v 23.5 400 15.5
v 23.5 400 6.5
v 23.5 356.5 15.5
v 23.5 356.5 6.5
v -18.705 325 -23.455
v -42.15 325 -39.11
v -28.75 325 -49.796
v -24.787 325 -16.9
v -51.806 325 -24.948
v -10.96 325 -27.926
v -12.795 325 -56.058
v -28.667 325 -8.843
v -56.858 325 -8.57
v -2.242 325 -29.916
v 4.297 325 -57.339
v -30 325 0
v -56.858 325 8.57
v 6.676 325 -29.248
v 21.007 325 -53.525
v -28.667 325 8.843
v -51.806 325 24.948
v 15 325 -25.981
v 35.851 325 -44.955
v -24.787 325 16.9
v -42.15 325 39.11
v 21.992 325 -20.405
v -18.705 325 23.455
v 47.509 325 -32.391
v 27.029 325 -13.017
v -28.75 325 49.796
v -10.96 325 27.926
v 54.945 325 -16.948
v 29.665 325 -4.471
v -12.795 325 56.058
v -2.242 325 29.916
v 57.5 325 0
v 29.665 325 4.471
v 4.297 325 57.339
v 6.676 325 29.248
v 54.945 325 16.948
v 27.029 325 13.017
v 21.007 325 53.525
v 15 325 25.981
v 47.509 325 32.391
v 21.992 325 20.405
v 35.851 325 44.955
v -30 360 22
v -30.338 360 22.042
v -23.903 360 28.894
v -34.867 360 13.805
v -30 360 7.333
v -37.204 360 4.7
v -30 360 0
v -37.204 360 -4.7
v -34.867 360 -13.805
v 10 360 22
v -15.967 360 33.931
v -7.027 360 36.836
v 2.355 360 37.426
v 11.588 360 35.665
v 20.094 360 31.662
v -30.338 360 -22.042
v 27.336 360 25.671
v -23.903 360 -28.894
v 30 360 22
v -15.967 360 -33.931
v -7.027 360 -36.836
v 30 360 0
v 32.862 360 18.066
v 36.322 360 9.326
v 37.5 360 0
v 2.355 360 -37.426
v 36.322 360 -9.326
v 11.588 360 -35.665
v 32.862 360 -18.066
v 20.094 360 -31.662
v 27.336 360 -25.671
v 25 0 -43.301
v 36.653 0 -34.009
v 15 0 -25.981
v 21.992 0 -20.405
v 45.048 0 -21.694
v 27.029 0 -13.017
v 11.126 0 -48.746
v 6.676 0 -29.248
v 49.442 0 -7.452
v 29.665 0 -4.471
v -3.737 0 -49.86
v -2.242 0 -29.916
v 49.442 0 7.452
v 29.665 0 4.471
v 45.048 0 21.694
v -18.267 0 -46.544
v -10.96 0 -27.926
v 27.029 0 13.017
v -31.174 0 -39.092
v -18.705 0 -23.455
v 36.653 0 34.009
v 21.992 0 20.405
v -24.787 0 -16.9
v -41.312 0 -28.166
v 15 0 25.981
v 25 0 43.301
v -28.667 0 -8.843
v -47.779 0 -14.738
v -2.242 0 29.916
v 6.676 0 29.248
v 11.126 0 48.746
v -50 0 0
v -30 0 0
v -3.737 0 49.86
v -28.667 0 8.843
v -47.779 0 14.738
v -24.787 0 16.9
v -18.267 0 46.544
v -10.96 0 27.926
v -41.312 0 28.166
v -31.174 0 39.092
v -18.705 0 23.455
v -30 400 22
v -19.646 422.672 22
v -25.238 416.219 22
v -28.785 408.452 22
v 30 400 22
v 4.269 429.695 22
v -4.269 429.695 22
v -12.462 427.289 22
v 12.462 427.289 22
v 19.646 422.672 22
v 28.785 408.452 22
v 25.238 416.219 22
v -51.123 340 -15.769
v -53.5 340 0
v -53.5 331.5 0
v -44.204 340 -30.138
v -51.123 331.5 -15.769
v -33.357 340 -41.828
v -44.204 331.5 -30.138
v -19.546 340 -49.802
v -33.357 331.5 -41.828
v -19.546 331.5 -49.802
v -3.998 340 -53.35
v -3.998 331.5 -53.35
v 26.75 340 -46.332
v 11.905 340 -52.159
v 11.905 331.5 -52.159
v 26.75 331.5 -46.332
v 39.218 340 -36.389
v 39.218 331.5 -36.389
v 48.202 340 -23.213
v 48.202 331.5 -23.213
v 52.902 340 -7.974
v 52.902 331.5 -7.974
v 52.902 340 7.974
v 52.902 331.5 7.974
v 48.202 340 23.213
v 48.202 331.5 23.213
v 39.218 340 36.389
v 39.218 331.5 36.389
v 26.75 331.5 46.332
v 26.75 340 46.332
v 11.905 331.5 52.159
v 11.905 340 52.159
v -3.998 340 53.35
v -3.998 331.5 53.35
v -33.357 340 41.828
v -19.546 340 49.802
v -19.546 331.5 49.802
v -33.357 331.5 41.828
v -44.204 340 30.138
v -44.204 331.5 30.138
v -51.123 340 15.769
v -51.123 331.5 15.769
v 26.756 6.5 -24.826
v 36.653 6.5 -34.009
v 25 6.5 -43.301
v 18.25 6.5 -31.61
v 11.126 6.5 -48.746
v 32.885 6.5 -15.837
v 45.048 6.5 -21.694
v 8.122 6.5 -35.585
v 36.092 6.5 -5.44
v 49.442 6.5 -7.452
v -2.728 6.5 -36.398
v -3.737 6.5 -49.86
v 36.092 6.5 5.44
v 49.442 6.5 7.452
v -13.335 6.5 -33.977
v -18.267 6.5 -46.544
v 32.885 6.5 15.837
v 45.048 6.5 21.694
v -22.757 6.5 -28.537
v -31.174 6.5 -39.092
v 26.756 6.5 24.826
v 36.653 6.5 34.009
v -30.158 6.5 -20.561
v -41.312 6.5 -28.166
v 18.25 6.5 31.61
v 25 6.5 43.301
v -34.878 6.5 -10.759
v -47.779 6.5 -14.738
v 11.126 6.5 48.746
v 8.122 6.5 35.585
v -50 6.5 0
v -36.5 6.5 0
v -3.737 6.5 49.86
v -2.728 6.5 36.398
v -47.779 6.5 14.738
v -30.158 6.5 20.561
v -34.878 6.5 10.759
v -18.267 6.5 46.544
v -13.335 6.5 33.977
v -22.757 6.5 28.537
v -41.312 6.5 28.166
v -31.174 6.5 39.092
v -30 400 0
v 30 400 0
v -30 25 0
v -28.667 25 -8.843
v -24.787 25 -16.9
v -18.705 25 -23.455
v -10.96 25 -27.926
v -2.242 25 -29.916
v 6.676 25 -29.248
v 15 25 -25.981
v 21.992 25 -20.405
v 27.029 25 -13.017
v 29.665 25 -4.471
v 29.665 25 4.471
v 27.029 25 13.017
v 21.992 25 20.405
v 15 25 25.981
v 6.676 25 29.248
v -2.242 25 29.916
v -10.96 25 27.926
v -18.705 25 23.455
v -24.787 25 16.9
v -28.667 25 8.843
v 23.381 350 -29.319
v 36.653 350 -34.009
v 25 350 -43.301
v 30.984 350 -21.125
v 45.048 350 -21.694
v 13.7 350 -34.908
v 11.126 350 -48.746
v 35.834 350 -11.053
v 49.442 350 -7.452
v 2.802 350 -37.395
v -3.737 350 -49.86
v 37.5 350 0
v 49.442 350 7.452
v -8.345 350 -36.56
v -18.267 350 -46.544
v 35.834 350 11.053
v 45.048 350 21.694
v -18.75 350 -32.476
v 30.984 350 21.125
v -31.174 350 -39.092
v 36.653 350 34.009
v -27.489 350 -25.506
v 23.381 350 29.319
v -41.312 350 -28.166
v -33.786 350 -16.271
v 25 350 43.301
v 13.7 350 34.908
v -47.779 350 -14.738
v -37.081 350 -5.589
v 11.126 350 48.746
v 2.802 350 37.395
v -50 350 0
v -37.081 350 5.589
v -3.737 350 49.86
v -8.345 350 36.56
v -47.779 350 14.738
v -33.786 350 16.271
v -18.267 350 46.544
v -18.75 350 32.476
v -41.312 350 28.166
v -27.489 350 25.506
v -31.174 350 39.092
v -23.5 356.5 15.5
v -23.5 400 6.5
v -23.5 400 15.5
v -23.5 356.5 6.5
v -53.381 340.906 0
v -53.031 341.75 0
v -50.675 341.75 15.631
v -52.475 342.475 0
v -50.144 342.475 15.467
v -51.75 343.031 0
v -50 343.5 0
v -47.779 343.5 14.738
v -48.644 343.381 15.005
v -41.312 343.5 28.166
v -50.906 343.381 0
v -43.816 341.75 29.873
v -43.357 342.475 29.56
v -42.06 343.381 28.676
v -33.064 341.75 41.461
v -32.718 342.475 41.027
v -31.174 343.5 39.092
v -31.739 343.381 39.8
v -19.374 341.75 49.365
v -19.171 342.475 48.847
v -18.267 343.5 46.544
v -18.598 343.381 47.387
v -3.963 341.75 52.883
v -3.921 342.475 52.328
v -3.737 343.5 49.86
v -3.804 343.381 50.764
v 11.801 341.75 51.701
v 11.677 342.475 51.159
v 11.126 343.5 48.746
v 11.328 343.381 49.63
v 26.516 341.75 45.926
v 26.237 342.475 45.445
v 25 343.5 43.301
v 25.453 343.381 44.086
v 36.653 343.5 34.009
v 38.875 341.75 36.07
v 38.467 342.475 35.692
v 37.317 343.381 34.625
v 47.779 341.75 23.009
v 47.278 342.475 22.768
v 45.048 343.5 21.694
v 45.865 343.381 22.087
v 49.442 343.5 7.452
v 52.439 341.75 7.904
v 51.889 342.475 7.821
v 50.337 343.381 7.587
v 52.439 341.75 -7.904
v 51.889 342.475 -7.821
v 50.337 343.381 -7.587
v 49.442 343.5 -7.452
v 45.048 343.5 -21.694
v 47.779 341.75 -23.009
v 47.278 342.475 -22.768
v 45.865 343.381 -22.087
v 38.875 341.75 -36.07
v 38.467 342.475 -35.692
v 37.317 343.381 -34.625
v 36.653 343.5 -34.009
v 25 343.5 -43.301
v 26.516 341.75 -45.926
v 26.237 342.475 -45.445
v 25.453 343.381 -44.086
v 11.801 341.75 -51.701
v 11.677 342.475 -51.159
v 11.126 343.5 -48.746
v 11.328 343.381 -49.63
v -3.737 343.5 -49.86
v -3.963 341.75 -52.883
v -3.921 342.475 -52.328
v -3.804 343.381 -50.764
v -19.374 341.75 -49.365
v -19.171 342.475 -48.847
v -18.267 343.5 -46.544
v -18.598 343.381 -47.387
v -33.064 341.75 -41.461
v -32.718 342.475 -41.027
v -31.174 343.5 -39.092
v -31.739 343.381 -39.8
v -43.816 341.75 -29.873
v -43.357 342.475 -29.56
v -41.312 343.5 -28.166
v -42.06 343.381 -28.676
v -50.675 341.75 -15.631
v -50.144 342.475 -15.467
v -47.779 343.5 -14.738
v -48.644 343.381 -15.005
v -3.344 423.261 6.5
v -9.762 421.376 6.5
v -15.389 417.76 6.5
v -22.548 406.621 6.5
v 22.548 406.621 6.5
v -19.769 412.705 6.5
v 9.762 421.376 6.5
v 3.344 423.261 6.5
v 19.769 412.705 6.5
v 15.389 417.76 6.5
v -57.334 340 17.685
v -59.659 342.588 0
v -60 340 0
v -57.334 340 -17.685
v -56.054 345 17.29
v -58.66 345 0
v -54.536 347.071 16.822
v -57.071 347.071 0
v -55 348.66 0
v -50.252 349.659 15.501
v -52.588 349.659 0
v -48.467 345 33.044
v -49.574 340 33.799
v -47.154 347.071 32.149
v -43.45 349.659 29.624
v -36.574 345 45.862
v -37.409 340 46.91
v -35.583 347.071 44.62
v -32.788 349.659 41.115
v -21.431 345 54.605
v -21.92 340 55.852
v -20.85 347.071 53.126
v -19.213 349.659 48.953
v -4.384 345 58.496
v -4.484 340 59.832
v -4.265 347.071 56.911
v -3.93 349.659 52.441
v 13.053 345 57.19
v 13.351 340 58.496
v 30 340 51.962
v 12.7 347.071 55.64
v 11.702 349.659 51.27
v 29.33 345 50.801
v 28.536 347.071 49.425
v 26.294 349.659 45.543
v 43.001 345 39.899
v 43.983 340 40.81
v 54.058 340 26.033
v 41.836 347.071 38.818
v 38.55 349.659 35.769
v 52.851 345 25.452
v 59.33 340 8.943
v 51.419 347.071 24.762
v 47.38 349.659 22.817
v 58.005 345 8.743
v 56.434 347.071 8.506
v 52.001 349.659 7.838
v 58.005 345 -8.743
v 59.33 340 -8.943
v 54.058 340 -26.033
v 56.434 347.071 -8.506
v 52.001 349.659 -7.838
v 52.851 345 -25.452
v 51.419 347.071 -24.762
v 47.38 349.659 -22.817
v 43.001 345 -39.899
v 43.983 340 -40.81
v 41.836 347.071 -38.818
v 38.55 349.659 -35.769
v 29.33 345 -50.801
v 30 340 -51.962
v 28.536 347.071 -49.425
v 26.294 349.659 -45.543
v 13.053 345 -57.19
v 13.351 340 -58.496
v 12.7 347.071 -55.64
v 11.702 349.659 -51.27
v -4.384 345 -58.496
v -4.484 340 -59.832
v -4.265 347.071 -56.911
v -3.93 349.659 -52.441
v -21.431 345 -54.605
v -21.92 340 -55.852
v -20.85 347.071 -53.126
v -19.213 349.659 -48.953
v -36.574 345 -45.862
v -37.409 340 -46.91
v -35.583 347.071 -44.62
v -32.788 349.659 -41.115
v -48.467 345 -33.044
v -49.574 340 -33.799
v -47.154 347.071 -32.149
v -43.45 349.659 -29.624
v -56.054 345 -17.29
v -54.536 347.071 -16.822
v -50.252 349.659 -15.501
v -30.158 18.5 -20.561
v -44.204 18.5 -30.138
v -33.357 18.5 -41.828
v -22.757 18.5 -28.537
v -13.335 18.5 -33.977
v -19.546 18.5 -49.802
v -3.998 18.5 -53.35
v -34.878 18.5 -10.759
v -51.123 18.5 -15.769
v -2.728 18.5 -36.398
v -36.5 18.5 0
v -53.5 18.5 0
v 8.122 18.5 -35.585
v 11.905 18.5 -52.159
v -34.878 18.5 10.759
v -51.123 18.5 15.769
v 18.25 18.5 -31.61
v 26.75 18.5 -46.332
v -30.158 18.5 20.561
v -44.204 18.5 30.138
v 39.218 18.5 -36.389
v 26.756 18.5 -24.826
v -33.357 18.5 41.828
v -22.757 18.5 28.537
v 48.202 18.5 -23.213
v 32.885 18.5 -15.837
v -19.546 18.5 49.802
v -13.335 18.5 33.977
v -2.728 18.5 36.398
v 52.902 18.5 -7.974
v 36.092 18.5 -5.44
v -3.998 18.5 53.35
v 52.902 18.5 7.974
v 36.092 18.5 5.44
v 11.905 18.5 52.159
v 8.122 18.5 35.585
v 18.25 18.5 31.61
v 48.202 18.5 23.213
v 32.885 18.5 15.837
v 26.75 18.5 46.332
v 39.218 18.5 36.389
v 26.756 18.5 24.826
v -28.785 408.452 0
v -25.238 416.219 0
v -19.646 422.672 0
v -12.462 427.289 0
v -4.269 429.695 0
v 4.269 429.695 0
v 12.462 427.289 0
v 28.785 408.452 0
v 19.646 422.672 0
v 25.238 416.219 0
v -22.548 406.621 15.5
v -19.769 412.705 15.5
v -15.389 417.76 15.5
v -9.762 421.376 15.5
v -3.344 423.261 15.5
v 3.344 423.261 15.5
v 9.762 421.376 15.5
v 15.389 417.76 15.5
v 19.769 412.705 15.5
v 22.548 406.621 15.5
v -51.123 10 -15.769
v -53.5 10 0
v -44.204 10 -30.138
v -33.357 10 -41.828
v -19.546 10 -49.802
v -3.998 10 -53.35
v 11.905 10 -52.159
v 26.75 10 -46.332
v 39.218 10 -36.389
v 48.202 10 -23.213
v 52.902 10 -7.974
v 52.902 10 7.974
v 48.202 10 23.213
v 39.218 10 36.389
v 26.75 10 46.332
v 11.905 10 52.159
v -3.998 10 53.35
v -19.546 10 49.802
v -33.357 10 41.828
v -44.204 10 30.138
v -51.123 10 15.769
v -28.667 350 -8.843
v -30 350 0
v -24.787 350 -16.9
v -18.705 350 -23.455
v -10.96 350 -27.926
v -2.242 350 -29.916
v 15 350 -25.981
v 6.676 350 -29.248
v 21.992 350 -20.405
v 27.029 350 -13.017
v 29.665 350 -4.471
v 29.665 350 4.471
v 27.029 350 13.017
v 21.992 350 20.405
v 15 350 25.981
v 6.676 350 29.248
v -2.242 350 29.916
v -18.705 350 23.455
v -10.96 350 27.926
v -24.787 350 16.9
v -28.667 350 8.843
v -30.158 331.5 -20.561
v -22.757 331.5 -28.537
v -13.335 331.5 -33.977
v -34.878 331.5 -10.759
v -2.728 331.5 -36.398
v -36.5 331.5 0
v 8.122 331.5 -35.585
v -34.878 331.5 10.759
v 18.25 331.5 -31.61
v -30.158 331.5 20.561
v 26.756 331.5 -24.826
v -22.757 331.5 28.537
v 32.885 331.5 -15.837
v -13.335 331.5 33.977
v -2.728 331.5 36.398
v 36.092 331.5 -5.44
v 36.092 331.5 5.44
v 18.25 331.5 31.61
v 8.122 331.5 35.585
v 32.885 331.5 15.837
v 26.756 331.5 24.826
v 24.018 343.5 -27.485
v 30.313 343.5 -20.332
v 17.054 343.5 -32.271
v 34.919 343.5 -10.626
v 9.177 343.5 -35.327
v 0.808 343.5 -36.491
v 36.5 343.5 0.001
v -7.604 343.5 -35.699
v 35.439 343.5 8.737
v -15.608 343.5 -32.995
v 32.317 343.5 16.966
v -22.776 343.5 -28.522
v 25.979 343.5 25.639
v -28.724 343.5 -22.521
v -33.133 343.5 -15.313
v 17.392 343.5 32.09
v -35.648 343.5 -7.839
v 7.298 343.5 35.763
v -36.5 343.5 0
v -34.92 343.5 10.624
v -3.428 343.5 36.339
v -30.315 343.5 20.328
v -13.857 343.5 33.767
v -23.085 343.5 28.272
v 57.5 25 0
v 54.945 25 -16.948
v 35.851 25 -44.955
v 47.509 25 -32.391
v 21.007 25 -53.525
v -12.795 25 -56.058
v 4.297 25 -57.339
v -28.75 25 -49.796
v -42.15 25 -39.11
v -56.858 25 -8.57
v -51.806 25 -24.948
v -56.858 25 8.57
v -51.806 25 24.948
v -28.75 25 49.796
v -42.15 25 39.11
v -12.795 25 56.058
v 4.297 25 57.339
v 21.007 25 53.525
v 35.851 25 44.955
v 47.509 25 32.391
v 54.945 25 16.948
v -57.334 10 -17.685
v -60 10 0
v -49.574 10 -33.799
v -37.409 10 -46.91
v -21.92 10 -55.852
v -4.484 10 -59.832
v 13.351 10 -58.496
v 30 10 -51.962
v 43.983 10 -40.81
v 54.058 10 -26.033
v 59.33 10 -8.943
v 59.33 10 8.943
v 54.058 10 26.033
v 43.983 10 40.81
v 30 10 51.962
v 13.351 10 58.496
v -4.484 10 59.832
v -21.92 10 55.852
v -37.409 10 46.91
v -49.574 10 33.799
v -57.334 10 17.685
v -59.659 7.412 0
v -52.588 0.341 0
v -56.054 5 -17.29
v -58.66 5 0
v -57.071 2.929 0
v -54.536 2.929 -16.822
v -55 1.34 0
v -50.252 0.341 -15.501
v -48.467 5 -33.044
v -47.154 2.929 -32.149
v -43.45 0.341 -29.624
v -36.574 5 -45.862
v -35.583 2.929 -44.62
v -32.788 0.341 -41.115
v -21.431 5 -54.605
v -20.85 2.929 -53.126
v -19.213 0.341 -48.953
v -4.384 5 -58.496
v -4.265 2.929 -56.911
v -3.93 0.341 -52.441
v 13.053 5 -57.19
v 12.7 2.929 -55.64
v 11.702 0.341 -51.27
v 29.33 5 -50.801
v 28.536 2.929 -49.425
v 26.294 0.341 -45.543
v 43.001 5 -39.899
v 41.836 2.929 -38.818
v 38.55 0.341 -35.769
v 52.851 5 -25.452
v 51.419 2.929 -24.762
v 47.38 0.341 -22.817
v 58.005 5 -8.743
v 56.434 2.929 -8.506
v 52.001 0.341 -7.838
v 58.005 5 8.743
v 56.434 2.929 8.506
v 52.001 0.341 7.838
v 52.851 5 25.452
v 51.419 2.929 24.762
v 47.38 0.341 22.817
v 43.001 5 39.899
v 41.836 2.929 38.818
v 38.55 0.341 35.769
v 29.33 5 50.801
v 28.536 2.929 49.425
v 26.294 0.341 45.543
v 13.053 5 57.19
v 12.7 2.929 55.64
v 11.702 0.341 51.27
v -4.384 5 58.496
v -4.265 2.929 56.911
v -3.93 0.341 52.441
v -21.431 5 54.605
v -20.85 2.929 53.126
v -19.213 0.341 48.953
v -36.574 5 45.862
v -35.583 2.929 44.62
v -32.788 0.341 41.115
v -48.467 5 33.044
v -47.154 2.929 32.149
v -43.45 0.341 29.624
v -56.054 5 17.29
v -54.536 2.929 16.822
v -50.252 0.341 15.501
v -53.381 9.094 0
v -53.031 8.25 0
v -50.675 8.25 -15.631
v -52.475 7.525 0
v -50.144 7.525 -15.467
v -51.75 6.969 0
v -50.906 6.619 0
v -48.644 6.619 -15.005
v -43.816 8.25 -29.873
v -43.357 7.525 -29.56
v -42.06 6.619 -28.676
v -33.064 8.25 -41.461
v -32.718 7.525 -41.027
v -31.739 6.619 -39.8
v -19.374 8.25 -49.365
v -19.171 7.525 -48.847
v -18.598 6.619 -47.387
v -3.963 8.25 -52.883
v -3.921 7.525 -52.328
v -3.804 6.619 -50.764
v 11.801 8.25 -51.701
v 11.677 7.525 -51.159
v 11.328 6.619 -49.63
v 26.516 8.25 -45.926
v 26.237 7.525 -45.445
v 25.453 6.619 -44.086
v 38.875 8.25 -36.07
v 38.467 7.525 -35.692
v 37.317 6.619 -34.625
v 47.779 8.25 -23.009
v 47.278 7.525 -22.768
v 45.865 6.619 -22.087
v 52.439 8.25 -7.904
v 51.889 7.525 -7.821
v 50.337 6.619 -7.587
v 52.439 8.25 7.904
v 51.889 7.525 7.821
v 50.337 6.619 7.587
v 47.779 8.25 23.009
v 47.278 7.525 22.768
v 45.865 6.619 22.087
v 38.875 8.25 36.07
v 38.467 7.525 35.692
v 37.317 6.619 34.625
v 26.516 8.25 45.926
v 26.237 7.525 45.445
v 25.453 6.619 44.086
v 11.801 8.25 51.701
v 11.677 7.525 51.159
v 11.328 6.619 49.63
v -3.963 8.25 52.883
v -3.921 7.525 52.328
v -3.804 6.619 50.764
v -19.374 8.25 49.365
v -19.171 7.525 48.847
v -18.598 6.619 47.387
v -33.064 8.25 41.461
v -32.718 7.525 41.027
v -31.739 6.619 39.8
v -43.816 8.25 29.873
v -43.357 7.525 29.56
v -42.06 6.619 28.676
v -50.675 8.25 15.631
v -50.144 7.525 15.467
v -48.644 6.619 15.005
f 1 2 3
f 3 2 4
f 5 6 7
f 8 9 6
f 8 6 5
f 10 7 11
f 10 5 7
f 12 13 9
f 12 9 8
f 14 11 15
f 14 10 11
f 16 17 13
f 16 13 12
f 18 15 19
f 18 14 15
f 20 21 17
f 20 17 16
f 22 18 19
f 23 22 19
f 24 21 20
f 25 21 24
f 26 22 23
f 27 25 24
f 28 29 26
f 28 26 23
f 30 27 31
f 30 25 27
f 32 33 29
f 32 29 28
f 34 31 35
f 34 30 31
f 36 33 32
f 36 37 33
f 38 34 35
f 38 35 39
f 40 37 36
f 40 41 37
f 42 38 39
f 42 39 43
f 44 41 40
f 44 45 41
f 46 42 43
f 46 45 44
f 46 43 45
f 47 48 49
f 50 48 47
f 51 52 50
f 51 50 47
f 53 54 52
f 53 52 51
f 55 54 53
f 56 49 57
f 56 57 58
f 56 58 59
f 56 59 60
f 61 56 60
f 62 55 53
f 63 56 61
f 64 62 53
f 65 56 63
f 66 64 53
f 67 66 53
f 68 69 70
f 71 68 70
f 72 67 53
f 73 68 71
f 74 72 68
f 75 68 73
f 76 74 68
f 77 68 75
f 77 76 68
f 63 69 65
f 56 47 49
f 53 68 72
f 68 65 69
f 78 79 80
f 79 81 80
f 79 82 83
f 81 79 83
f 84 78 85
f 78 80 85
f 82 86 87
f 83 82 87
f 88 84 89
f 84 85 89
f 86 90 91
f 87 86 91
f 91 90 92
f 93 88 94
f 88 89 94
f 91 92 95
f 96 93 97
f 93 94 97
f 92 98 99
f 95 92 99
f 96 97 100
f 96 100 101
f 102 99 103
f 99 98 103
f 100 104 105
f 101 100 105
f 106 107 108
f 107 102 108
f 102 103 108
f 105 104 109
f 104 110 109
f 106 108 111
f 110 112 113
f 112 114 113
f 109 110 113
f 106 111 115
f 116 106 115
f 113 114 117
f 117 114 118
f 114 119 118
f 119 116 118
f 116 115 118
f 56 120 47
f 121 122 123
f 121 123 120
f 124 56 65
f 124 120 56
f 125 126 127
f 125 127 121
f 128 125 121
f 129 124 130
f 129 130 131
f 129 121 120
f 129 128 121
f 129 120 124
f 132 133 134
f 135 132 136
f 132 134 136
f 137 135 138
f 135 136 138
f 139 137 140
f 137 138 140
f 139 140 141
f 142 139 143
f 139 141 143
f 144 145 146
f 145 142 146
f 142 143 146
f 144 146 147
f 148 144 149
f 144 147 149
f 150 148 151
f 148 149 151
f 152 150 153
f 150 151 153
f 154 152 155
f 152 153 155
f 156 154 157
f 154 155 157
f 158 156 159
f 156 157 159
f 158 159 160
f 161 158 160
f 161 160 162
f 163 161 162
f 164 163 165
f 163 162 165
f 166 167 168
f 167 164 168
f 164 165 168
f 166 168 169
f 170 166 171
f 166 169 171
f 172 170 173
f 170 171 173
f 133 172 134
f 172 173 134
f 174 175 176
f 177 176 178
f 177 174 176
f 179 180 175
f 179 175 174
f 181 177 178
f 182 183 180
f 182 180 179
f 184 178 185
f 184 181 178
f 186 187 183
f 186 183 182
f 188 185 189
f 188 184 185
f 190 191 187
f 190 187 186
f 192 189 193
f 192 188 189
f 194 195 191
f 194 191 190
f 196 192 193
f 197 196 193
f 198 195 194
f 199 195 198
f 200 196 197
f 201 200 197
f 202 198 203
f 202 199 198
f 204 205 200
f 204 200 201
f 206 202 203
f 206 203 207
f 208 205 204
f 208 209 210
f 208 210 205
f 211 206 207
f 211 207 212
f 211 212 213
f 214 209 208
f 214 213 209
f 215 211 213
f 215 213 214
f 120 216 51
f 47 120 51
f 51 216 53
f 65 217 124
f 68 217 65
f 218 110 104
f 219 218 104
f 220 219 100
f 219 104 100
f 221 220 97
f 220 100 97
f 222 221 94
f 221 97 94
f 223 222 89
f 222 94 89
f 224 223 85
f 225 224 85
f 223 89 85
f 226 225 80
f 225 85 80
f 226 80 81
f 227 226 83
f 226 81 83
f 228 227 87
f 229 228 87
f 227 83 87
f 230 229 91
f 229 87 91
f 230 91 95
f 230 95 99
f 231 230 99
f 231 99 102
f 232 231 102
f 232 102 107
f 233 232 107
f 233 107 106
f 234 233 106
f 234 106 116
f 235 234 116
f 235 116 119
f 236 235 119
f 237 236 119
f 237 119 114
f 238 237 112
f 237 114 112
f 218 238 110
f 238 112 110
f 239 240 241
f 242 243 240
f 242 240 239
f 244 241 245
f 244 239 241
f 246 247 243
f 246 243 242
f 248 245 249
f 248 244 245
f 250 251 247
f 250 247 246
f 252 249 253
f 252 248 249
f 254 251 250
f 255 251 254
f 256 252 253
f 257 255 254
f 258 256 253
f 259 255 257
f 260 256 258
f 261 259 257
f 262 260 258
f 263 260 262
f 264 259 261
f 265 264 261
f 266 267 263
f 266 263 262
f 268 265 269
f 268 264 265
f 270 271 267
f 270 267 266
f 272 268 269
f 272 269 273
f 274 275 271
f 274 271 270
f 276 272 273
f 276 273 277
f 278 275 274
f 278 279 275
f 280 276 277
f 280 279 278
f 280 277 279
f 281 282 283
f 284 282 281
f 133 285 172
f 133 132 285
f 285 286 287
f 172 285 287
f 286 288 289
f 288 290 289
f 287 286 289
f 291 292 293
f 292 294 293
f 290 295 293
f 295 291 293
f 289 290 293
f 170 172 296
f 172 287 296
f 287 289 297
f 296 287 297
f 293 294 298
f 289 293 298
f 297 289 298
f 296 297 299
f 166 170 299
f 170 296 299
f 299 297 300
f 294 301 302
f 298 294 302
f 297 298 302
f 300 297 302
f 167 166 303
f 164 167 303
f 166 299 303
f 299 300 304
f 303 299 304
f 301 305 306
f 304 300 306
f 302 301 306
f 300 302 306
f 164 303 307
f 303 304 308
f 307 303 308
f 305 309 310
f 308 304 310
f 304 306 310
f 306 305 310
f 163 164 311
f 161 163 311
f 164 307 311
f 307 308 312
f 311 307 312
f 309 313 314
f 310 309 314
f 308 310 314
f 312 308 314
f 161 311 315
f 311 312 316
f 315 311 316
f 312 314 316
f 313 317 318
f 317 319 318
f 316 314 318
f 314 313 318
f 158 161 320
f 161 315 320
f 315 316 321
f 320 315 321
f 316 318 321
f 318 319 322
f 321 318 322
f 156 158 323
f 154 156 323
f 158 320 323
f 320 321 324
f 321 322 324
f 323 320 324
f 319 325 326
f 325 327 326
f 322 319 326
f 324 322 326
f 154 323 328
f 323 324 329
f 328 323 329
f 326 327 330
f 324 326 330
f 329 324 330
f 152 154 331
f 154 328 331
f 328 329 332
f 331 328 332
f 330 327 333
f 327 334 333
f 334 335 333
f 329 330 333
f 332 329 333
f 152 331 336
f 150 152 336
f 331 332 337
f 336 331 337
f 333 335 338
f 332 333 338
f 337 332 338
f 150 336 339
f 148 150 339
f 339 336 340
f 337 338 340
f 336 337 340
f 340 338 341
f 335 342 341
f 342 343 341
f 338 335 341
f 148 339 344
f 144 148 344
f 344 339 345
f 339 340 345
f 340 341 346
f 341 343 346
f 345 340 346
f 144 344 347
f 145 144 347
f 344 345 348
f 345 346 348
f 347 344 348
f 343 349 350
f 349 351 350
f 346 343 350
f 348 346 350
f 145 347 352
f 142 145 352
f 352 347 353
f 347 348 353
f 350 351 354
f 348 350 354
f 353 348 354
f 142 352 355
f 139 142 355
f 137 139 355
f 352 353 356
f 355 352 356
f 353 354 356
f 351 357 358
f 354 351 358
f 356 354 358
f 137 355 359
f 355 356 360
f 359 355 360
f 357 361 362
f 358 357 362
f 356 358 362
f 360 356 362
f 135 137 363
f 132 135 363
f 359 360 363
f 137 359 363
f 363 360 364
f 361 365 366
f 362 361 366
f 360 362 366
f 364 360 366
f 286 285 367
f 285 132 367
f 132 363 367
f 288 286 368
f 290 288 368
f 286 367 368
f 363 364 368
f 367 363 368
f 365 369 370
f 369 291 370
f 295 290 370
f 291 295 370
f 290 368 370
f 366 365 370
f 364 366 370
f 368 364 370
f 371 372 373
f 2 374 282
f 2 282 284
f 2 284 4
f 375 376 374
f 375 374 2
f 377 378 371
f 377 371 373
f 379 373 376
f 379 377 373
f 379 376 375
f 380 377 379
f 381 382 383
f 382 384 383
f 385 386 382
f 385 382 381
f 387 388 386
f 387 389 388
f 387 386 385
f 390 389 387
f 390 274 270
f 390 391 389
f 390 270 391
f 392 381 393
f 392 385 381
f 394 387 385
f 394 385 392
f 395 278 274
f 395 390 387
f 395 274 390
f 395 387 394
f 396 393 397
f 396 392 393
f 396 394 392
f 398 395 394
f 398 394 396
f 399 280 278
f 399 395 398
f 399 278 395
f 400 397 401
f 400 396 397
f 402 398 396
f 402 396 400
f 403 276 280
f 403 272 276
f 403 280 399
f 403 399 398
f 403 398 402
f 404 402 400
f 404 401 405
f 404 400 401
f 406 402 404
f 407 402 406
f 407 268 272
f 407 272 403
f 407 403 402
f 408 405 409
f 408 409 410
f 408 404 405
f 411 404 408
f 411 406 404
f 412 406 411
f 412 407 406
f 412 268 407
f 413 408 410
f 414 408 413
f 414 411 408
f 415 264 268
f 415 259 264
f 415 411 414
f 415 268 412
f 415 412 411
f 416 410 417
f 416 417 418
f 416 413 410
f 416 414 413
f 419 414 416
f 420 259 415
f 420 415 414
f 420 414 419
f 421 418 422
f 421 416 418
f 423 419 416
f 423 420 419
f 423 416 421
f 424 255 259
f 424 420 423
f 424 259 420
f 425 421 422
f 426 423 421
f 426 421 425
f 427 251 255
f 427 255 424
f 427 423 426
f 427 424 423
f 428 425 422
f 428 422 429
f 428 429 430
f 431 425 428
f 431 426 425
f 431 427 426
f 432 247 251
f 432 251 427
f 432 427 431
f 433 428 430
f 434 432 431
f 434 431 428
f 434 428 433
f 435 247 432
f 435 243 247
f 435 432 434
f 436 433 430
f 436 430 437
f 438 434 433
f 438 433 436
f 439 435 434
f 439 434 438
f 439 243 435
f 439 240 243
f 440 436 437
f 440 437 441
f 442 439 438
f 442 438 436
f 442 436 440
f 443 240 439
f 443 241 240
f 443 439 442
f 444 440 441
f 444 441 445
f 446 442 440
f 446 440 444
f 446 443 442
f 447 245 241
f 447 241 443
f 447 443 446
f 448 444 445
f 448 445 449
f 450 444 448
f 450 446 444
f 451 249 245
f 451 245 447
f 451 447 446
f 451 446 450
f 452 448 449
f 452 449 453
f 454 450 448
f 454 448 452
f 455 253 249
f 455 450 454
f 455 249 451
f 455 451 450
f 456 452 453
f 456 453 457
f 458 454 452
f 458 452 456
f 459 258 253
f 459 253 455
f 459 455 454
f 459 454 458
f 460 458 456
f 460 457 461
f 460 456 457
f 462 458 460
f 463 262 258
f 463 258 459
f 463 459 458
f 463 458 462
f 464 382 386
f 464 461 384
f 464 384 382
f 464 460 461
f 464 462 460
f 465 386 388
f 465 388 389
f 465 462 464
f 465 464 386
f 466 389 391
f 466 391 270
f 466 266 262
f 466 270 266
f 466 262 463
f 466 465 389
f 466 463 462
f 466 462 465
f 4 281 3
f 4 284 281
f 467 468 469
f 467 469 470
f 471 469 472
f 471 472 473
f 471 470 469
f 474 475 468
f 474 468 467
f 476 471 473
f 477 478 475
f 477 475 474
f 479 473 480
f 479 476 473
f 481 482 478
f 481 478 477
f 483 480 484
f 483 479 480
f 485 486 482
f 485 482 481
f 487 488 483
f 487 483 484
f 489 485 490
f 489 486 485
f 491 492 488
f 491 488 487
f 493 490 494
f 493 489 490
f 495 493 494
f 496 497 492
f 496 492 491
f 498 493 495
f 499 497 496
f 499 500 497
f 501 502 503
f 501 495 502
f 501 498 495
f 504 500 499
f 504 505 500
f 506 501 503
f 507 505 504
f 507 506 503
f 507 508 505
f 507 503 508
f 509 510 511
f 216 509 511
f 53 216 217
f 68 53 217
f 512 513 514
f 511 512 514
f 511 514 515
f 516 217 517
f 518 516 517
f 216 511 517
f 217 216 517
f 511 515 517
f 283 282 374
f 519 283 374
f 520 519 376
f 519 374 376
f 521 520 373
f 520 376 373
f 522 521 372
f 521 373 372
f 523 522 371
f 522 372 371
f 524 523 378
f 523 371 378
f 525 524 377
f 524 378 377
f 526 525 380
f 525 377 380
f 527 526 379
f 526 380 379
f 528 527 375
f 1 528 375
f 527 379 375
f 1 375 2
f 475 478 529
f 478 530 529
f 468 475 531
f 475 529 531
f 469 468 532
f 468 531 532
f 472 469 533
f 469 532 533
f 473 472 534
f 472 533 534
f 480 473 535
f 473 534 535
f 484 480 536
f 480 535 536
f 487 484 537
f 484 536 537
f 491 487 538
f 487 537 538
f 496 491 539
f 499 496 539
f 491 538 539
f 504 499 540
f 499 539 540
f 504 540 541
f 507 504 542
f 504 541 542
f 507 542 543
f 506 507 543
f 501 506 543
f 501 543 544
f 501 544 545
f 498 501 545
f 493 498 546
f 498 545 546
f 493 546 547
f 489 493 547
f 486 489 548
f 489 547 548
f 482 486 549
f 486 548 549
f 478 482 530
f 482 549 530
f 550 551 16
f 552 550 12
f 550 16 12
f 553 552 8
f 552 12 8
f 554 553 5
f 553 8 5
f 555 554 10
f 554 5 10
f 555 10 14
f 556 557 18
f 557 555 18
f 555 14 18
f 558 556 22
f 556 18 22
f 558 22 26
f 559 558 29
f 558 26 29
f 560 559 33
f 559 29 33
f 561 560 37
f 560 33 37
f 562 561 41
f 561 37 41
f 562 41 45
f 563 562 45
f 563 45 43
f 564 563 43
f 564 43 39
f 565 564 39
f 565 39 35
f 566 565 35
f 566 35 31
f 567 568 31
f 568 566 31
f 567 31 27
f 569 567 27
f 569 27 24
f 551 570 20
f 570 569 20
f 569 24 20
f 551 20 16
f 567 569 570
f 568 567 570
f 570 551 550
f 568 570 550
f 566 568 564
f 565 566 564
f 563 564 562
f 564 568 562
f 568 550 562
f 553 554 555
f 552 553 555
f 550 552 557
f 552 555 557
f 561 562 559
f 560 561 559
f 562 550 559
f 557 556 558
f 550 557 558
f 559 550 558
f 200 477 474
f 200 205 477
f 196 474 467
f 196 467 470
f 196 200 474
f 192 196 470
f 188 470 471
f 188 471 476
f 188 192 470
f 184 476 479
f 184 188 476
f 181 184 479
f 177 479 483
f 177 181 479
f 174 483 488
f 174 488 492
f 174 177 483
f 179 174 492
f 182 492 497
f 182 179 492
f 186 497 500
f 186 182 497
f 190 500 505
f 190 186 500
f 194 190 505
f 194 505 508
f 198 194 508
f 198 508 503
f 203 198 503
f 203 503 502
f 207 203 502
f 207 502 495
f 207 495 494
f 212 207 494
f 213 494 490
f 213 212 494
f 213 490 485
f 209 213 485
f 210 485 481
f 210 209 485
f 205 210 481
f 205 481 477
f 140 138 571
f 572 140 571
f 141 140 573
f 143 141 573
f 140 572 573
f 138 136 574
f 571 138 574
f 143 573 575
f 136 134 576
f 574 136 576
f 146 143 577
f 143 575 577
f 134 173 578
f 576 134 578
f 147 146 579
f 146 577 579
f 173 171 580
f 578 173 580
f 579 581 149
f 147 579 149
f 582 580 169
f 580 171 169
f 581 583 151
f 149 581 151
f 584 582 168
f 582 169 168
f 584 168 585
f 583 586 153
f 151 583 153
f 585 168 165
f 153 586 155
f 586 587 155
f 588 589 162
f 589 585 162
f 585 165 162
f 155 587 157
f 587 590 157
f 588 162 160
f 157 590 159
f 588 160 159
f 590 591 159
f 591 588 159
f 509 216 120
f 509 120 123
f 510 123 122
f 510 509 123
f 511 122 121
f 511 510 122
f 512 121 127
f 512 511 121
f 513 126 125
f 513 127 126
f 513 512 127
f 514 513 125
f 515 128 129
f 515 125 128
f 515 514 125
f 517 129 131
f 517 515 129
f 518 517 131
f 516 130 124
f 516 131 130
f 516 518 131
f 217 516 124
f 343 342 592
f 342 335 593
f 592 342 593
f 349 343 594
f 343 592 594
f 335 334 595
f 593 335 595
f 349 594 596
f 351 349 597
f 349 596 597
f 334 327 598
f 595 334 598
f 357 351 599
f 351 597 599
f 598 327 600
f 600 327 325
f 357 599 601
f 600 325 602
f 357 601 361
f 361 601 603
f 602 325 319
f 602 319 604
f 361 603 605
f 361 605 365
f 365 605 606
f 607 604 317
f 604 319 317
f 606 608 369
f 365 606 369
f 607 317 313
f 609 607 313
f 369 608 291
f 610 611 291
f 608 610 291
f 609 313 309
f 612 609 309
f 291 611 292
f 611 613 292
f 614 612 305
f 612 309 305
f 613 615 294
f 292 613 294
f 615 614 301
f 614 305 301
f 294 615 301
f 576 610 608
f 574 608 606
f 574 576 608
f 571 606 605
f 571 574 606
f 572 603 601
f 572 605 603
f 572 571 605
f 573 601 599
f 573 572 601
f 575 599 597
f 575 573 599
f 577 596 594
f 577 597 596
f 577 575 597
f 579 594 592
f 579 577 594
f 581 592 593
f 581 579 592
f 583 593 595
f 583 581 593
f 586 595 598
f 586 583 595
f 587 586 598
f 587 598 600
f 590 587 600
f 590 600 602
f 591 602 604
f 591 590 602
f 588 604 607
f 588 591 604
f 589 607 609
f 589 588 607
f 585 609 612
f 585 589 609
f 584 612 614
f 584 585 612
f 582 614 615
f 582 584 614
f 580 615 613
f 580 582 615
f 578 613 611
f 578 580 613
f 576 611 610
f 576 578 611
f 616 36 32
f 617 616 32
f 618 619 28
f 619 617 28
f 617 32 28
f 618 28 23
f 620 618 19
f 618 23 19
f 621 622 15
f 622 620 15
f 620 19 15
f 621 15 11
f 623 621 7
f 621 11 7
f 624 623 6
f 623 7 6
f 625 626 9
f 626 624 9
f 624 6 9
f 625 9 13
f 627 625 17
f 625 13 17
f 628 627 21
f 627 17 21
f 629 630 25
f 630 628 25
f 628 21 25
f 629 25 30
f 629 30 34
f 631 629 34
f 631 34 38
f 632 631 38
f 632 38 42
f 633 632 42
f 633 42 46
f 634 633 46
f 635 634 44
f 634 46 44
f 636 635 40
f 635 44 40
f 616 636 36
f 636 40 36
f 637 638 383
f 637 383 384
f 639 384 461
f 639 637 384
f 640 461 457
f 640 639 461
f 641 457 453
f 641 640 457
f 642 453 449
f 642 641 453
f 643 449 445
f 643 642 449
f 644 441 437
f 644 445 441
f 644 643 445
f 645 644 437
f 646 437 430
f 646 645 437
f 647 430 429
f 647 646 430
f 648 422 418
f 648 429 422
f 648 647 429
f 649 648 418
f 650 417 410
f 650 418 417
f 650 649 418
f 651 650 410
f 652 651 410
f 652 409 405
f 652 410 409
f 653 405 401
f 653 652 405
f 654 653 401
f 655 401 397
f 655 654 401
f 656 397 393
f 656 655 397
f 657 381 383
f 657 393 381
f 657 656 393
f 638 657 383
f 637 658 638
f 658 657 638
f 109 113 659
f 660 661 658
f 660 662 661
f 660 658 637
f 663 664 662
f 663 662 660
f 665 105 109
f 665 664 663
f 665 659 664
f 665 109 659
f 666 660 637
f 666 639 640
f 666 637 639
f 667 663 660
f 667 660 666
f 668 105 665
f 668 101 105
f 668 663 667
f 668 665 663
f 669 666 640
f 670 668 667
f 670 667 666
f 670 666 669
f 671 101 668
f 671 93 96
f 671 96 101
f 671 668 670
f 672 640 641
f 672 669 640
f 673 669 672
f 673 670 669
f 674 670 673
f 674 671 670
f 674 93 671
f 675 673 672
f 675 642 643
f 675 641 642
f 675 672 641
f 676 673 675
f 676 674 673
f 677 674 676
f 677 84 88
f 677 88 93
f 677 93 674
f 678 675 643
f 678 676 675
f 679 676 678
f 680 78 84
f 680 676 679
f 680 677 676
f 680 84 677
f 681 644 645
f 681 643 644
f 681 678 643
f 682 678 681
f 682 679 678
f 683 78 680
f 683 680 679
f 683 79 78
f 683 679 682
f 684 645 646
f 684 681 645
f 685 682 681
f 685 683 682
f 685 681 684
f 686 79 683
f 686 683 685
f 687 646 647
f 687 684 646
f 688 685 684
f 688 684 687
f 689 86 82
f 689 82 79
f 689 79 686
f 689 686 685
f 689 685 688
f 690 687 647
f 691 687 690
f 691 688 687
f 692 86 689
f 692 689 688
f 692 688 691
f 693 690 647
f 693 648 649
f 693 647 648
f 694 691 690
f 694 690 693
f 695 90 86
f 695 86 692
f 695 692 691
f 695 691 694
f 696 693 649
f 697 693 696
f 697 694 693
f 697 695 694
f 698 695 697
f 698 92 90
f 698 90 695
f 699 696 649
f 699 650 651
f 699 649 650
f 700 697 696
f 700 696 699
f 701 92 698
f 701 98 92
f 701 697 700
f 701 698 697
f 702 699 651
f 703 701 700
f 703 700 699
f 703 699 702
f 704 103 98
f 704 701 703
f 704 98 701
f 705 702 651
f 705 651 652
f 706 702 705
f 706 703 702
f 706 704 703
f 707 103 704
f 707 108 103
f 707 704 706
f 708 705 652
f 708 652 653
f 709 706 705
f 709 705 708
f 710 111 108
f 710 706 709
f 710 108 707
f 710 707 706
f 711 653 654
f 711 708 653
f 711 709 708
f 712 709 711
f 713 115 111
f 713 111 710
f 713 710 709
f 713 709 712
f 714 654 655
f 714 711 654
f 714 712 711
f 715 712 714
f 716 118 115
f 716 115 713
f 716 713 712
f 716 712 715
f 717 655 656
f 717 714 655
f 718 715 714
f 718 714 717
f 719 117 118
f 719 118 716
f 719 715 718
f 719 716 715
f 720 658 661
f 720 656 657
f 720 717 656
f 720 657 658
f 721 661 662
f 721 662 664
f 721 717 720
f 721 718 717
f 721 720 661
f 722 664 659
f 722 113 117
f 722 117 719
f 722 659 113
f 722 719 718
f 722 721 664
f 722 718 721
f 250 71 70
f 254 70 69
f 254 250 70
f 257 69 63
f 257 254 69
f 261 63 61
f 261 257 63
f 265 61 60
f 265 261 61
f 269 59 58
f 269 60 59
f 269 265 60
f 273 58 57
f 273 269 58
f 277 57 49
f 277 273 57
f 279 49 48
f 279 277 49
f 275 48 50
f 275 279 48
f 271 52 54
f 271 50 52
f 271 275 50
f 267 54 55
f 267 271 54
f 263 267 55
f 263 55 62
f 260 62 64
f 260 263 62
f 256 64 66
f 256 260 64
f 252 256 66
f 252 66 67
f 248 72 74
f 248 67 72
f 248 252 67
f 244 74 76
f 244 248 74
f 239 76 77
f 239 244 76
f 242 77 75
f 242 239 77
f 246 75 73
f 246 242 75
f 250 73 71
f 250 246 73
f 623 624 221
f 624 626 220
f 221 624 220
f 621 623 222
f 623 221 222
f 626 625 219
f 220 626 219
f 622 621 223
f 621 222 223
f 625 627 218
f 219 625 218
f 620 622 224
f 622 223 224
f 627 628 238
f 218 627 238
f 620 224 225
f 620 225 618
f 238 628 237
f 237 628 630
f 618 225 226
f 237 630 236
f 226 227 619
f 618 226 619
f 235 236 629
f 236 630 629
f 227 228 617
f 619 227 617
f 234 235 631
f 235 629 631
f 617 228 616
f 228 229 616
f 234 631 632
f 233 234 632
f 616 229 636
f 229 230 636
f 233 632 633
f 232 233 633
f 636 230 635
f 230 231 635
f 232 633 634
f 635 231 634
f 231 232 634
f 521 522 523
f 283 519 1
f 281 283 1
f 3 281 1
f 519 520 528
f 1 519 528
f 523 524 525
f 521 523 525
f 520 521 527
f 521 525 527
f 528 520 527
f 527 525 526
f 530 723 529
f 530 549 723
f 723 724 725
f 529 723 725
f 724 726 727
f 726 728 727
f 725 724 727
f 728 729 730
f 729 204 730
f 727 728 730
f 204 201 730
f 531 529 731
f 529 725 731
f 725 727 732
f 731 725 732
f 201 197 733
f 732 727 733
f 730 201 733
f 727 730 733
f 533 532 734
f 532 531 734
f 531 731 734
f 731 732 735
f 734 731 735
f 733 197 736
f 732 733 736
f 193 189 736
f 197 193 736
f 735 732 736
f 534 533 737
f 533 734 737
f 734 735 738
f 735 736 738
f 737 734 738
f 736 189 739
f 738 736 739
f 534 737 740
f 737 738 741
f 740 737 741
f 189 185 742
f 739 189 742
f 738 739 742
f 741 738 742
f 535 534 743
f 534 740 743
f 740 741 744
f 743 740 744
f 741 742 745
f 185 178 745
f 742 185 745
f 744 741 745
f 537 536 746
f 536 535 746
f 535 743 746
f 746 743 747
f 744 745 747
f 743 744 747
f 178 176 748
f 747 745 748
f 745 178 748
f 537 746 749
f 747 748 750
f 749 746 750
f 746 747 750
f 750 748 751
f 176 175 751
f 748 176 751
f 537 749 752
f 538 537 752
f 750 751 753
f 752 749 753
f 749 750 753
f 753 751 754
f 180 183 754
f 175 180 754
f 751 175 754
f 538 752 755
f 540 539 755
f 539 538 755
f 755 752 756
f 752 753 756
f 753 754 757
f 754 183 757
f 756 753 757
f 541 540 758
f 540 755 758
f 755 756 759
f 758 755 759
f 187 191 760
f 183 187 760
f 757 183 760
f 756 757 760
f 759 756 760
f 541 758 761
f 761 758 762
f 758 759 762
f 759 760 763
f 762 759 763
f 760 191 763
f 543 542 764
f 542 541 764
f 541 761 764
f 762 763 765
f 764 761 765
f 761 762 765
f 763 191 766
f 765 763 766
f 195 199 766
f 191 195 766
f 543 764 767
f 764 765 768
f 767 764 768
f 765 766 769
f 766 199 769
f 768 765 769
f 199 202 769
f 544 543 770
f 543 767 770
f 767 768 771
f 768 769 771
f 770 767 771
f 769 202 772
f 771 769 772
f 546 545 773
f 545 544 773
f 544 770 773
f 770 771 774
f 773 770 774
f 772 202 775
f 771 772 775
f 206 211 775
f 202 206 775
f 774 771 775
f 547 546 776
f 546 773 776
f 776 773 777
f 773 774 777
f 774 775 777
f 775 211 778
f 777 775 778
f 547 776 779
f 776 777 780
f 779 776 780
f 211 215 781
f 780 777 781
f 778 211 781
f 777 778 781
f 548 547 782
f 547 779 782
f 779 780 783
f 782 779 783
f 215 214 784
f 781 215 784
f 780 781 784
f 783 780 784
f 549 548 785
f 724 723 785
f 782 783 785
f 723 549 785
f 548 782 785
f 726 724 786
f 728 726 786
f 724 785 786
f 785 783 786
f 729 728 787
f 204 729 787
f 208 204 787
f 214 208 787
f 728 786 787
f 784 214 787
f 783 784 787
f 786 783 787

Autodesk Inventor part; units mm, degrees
ref_plane "YZ Plane" through (0, 0, 0) normal (1, 0, 0) x (0, 1, 0)
ref_plane "XZ Plane" through (0, 0, 0) normal (0, 1, 0) x (-1, 0, 0)
sketch "Sketch1" plane through (0, 0, 0) normal (0, 1, 0) x (-1, 0, 0)
  circle A0 centre (0, 0) radius 60
  circle A1 centre (0, 0) radius 30
  dimension "d0" = 120
  dimension "d3" = 60
extrude "Extrusion1" add sketch "Sketch1" along normal blind 350
sketch "Sketch2" plane through (0, 350, 0) normal (0, 1, 0) x (1, 0, 0)
  circle A0 centre (0, 0) radius 37.5
  dimension "d7" = 75
extrude "Extrusion2" add sketch "Sketch2" along normal blind 10
sketch "Sketch4" plane through (0, 360, 0) normal (0, 1, 0) x (1, 0, 0)
  point P0 (0, 0)
sketch "Sketch5" plane through (0, 0, 0) normal (0, 0, 1) x (1, 0, 0)
  line L0 (37.5, 360) -> (-37.5, 360) projected
  line L1 (0, 360) -> (0, 400)
  circle A0 centre (0, 400) radius 30
  line L2 (30, 400) -> (30, 360)
  line L3 (-30, 400) -> (-30, 360)
  line L4 (-30, 360) -> (30, 360)
  point P0 (0, 0)
  dimension "d13" = 40
  dimension "d14" = 60
extrude "Extrusion4" add sketch "Sketch5" along normal blind 22
fillet "Fillet1" radius 10 2 edges at (60, 350, 0) (60, 0, 0)
ref_plane "Work Plane1" through (0, 175, 0) normal (0, -1, 0) x (1, 0, 0)
sketch "Sketch6" plane through (0, 175, 0) normal (0, -1, 0) x (1, 0, 0)
  circle A0 centre (0, 0) radius 57.5
  dimension "d23" = 115
extrude "Extrusion5" cut sketch "Sketch6" along normal mid plane 300
shell "Shell1" thickness 6.5 removed faces 0
properties part number "Arm1" material "Aluminum 6061"
